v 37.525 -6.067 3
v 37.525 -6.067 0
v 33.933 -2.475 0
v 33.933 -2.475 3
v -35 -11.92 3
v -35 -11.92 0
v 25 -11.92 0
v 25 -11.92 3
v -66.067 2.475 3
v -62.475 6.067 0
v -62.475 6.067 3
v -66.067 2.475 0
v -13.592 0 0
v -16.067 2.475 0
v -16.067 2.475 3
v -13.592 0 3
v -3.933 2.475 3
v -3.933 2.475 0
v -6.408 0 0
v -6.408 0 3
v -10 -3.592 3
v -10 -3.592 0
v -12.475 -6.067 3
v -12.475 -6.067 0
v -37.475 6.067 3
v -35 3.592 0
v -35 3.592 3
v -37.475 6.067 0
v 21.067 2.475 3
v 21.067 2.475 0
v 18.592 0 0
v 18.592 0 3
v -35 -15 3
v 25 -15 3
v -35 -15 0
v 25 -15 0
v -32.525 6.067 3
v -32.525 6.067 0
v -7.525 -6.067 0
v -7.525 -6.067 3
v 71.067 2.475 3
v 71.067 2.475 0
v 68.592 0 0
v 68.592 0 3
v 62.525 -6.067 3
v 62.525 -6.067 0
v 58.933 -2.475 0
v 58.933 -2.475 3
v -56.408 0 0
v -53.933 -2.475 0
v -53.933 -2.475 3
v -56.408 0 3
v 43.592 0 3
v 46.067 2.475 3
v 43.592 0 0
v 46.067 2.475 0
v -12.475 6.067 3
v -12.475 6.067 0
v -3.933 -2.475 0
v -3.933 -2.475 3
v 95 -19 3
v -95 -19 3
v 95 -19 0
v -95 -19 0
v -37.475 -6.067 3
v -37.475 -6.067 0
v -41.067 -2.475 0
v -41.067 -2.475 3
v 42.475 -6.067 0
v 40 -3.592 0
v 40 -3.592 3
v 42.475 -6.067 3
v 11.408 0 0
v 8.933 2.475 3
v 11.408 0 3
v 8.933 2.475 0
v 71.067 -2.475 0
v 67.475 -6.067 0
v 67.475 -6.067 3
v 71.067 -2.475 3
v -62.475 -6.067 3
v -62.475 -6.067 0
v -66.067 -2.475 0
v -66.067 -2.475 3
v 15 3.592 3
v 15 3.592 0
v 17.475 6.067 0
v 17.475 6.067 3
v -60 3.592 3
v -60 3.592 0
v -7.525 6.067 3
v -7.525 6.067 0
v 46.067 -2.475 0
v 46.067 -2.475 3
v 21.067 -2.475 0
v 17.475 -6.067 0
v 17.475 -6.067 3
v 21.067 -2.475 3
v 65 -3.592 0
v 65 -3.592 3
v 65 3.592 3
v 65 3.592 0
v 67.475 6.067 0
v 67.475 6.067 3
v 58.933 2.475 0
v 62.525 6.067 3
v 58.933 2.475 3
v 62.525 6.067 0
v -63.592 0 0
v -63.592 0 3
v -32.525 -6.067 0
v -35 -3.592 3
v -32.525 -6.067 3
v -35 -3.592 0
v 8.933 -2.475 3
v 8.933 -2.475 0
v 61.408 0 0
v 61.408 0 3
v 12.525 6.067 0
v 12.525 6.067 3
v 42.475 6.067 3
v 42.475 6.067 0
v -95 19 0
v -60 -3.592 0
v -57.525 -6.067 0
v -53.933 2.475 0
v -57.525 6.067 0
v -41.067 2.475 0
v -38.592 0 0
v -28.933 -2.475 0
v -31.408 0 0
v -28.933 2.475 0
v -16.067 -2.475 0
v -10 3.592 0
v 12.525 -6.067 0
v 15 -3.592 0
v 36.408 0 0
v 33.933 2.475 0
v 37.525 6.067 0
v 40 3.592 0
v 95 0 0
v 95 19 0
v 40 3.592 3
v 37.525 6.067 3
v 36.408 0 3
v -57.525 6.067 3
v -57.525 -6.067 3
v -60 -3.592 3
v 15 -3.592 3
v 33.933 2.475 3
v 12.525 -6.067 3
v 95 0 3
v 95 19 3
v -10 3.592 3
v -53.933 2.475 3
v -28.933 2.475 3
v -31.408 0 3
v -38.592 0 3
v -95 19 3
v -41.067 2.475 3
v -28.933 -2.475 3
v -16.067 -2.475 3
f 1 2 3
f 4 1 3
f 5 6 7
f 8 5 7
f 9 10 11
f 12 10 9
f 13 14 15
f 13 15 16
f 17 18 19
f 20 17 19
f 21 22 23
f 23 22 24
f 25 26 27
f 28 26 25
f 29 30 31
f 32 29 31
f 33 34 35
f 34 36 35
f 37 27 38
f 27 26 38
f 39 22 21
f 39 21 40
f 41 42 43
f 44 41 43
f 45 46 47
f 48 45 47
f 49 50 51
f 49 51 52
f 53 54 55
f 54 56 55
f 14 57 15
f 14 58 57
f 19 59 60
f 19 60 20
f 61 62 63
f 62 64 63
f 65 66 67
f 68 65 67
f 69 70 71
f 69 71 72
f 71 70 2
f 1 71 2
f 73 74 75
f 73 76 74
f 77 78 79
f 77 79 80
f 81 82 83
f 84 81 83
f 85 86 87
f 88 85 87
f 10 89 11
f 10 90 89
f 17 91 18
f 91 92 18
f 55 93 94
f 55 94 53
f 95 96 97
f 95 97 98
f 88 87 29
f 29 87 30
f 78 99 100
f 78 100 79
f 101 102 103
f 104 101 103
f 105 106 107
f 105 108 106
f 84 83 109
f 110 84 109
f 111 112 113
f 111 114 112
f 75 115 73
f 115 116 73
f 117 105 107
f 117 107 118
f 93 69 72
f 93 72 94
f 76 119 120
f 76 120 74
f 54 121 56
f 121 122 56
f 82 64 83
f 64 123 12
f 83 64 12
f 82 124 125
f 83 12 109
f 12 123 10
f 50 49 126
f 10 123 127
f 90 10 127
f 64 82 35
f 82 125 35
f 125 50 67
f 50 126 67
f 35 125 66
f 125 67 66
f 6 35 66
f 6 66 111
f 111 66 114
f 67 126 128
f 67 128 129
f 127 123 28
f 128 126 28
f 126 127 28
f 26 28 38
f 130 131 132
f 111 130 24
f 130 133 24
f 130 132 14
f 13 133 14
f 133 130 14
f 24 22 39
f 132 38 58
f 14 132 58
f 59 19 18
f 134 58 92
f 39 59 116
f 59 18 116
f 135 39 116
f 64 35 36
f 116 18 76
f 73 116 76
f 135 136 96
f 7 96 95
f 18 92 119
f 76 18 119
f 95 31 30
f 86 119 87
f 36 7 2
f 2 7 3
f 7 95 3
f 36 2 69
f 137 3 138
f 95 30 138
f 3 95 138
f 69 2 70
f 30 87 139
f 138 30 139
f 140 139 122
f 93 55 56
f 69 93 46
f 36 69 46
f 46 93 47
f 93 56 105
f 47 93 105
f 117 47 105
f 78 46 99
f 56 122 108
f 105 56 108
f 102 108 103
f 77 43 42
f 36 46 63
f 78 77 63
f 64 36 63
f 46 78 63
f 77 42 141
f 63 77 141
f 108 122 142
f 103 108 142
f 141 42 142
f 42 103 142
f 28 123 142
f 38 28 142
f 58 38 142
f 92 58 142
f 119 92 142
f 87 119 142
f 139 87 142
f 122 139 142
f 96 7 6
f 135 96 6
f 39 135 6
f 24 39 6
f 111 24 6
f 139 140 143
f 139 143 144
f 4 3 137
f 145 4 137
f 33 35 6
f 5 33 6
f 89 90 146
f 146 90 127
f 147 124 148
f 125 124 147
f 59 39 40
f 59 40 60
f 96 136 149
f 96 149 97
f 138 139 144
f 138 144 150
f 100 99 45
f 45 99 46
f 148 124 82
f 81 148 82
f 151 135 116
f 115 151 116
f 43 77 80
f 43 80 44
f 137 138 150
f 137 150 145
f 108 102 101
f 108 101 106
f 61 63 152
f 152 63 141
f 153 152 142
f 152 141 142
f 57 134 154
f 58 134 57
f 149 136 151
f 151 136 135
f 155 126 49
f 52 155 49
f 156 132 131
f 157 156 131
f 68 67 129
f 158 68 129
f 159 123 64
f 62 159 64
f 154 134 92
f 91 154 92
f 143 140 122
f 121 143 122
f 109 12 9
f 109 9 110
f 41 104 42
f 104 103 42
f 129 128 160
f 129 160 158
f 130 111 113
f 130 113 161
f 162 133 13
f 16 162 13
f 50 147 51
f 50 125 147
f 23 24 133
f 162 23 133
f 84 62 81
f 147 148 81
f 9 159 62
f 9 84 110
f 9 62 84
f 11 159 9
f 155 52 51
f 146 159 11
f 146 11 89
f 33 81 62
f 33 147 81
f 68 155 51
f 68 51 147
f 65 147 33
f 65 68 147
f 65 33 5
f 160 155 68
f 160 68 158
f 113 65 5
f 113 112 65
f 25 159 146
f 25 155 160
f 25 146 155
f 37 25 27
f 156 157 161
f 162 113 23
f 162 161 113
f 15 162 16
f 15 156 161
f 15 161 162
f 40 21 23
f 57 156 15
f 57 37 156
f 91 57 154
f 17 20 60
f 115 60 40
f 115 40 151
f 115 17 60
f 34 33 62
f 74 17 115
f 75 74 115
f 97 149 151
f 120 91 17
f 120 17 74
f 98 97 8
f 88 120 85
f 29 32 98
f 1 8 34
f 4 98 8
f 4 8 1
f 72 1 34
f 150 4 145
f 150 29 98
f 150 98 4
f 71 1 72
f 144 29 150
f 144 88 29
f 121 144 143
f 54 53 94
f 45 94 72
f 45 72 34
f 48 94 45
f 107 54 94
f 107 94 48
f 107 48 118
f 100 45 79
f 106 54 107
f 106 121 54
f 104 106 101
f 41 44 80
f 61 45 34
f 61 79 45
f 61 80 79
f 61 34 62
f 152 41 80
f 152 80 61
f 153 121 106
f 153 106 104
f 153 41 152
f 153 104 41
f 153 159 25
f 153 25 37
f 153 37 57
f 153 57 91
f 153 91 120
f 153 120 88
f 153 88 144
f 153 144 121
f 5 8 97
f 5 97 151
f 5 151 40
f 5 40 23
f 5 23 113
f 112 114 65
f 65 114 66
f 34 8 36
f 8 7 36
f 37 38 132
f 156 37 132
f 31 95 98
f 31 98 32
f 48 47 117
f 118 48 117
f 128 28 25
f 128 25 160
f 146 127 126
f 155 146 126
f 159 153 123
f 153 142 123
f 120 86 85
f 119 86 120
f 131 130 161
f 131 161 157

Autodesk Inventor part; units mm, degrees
ref_plane "YZ Plane" through (0, 0, 0) normal (1, 0, 0) x (0, 1, 0)
ref_plane "XZ Plane" through (0, 0, 0) normal (0, 1, 0) x (-1, 0, 0)
ref_plane "XY Plane" through (0, 0, 0) normal (0, 0, 1) x (1, 0, 0)
sketch "Sketch1" plane through (0, 0, 0) normal (0, 0, 1) x (1, 0, 0)
  line L0 (-95, -19) -> (95, -19)
  line L1 (95, -19) -> (95, 19)
  line L2 (95, 19) -> (-95, 19)
  line L3 (-95, 19) -> (-95, -19)
  line L4 (-95, -19) -> (95, 19) construction
  line L5 (95, -19) -> (-95, 19) construction
  line L6 (-35, -11.92) -> (25, -11.92)
  line L7 (25, -11.92) -> (25, -15)
  line L8 (25, -15) -> (-35, -15)
  line L9 (-35, -15) -> (-35, -11.92)
  line L10 (-35, -11.92) -> (25, -15) construction
  line L11 (25, -11.92) -> (-35, -15) construction
  line L12 (62.5251, 6.067) -> (58.933, 2.4749)
  line L13 (58.933, 2.4749) -> (67.4749, -6.067)
  line L14 (67.4749, -6.067) -> (71.067, -2.4749)
  line L15 (71.067, -2.4749) -> (62.5251, 6.067)
  line L16 (67.4749, 6.067) -> (71.067, 2.4749)
  line L17 (71.067, 2.4749) -> (62.5251, -6.067)
  line L18 (62.5251, -6.067) -> (58.933, -2.4749)
  line L19 (58.933, -2.4749) -> (67.4749, 6.067)
  line L20 (60.7291, -4.2709) -> (69.2709, 4.2709)
  line L21 (60.7291, 4.2709) -> (69.2709, -4.2709)
  line L22 (0, 0) -> (95, 0)
  point P0 (-5, -13.46)
  point P1 (-5, -11.92)
  point P2 (65, 0)
  point P3 (68.5921, 0)
  point P4 (65, -3.5921)
  point P5 (61.4079, 0)
  point P6 (65, 3.5921)
  dimension "d0" = 38
  dimension "d1" = 190
  dimension "d2" = 3.08
  dimension "d3" = 60
  dimension "d4" = 100
  dimension "d5" = 4
  dimension "d6" = 45
  dimension "d7" = 5.08
  dimension "d8" = 12.08
  dimension "d9" = 30
extrude "Plate1" add sketch "Sketch1" along normal blind 3 contours L15 L14 L21 L17 | L17 L21 L22 | L22 L20 L15 | L15 L20 L16 L17 | L3 L2 L1 L0 | L20 L21 L19 L15 | L15 L19 L16 L20 | L21 L14 L13 L17 | L17 L13 L20 L21 | L22 L19 L21 | L20 L13 L22 | L19 L21 L12 L15 | L17 L18 L20 L13 | L20 L18 L19 L13 | L19 L13 L12 L21
extrude "Cut1" cut sketch "Sketch1" along normal through all contours L15 L14 L21 L17 | L17 L21 L22 | L22 L20 L15 | L15 L20 L16 L17 | L20 L21 L19 L15 | L15 L19 L16 L20 | L21 L14 L13 L17 | L17 L13 L20 L21 | L22 L19 L21 | L20 L13 L22 | L19 L21 L12 L15 | L17 L18 L20 L13 | L20 L18 L19 L13 | L19 L13 L12 L21
pattern_linear "Rectangular Pattern1" count 6 spacing 25 along (-1, 0, 0) of "Cut1"
equation "\"d11\" = Thickness"
equation "\"d10\" = Thickness"
equation "\"BendRadius\" = Thickness"
equation "\"BendReliefWidth\" = Thickness"
equation "\"BendReliefDepth\" = 0.5 * Thickness"
equation "\"CornerReliefSize\" = 4 * Thickness"
equation "\"MinimumRemnant\" = 2 * Thickness"
equation "\"TransitionRadius\" = BendRadius"
equation "\"JacobiRadiusSize\" = BendRadius"
equation "\"GapSize\" = Thickness"
equation "\"Thickness\" = 3"
properties part number "Extension.2"
